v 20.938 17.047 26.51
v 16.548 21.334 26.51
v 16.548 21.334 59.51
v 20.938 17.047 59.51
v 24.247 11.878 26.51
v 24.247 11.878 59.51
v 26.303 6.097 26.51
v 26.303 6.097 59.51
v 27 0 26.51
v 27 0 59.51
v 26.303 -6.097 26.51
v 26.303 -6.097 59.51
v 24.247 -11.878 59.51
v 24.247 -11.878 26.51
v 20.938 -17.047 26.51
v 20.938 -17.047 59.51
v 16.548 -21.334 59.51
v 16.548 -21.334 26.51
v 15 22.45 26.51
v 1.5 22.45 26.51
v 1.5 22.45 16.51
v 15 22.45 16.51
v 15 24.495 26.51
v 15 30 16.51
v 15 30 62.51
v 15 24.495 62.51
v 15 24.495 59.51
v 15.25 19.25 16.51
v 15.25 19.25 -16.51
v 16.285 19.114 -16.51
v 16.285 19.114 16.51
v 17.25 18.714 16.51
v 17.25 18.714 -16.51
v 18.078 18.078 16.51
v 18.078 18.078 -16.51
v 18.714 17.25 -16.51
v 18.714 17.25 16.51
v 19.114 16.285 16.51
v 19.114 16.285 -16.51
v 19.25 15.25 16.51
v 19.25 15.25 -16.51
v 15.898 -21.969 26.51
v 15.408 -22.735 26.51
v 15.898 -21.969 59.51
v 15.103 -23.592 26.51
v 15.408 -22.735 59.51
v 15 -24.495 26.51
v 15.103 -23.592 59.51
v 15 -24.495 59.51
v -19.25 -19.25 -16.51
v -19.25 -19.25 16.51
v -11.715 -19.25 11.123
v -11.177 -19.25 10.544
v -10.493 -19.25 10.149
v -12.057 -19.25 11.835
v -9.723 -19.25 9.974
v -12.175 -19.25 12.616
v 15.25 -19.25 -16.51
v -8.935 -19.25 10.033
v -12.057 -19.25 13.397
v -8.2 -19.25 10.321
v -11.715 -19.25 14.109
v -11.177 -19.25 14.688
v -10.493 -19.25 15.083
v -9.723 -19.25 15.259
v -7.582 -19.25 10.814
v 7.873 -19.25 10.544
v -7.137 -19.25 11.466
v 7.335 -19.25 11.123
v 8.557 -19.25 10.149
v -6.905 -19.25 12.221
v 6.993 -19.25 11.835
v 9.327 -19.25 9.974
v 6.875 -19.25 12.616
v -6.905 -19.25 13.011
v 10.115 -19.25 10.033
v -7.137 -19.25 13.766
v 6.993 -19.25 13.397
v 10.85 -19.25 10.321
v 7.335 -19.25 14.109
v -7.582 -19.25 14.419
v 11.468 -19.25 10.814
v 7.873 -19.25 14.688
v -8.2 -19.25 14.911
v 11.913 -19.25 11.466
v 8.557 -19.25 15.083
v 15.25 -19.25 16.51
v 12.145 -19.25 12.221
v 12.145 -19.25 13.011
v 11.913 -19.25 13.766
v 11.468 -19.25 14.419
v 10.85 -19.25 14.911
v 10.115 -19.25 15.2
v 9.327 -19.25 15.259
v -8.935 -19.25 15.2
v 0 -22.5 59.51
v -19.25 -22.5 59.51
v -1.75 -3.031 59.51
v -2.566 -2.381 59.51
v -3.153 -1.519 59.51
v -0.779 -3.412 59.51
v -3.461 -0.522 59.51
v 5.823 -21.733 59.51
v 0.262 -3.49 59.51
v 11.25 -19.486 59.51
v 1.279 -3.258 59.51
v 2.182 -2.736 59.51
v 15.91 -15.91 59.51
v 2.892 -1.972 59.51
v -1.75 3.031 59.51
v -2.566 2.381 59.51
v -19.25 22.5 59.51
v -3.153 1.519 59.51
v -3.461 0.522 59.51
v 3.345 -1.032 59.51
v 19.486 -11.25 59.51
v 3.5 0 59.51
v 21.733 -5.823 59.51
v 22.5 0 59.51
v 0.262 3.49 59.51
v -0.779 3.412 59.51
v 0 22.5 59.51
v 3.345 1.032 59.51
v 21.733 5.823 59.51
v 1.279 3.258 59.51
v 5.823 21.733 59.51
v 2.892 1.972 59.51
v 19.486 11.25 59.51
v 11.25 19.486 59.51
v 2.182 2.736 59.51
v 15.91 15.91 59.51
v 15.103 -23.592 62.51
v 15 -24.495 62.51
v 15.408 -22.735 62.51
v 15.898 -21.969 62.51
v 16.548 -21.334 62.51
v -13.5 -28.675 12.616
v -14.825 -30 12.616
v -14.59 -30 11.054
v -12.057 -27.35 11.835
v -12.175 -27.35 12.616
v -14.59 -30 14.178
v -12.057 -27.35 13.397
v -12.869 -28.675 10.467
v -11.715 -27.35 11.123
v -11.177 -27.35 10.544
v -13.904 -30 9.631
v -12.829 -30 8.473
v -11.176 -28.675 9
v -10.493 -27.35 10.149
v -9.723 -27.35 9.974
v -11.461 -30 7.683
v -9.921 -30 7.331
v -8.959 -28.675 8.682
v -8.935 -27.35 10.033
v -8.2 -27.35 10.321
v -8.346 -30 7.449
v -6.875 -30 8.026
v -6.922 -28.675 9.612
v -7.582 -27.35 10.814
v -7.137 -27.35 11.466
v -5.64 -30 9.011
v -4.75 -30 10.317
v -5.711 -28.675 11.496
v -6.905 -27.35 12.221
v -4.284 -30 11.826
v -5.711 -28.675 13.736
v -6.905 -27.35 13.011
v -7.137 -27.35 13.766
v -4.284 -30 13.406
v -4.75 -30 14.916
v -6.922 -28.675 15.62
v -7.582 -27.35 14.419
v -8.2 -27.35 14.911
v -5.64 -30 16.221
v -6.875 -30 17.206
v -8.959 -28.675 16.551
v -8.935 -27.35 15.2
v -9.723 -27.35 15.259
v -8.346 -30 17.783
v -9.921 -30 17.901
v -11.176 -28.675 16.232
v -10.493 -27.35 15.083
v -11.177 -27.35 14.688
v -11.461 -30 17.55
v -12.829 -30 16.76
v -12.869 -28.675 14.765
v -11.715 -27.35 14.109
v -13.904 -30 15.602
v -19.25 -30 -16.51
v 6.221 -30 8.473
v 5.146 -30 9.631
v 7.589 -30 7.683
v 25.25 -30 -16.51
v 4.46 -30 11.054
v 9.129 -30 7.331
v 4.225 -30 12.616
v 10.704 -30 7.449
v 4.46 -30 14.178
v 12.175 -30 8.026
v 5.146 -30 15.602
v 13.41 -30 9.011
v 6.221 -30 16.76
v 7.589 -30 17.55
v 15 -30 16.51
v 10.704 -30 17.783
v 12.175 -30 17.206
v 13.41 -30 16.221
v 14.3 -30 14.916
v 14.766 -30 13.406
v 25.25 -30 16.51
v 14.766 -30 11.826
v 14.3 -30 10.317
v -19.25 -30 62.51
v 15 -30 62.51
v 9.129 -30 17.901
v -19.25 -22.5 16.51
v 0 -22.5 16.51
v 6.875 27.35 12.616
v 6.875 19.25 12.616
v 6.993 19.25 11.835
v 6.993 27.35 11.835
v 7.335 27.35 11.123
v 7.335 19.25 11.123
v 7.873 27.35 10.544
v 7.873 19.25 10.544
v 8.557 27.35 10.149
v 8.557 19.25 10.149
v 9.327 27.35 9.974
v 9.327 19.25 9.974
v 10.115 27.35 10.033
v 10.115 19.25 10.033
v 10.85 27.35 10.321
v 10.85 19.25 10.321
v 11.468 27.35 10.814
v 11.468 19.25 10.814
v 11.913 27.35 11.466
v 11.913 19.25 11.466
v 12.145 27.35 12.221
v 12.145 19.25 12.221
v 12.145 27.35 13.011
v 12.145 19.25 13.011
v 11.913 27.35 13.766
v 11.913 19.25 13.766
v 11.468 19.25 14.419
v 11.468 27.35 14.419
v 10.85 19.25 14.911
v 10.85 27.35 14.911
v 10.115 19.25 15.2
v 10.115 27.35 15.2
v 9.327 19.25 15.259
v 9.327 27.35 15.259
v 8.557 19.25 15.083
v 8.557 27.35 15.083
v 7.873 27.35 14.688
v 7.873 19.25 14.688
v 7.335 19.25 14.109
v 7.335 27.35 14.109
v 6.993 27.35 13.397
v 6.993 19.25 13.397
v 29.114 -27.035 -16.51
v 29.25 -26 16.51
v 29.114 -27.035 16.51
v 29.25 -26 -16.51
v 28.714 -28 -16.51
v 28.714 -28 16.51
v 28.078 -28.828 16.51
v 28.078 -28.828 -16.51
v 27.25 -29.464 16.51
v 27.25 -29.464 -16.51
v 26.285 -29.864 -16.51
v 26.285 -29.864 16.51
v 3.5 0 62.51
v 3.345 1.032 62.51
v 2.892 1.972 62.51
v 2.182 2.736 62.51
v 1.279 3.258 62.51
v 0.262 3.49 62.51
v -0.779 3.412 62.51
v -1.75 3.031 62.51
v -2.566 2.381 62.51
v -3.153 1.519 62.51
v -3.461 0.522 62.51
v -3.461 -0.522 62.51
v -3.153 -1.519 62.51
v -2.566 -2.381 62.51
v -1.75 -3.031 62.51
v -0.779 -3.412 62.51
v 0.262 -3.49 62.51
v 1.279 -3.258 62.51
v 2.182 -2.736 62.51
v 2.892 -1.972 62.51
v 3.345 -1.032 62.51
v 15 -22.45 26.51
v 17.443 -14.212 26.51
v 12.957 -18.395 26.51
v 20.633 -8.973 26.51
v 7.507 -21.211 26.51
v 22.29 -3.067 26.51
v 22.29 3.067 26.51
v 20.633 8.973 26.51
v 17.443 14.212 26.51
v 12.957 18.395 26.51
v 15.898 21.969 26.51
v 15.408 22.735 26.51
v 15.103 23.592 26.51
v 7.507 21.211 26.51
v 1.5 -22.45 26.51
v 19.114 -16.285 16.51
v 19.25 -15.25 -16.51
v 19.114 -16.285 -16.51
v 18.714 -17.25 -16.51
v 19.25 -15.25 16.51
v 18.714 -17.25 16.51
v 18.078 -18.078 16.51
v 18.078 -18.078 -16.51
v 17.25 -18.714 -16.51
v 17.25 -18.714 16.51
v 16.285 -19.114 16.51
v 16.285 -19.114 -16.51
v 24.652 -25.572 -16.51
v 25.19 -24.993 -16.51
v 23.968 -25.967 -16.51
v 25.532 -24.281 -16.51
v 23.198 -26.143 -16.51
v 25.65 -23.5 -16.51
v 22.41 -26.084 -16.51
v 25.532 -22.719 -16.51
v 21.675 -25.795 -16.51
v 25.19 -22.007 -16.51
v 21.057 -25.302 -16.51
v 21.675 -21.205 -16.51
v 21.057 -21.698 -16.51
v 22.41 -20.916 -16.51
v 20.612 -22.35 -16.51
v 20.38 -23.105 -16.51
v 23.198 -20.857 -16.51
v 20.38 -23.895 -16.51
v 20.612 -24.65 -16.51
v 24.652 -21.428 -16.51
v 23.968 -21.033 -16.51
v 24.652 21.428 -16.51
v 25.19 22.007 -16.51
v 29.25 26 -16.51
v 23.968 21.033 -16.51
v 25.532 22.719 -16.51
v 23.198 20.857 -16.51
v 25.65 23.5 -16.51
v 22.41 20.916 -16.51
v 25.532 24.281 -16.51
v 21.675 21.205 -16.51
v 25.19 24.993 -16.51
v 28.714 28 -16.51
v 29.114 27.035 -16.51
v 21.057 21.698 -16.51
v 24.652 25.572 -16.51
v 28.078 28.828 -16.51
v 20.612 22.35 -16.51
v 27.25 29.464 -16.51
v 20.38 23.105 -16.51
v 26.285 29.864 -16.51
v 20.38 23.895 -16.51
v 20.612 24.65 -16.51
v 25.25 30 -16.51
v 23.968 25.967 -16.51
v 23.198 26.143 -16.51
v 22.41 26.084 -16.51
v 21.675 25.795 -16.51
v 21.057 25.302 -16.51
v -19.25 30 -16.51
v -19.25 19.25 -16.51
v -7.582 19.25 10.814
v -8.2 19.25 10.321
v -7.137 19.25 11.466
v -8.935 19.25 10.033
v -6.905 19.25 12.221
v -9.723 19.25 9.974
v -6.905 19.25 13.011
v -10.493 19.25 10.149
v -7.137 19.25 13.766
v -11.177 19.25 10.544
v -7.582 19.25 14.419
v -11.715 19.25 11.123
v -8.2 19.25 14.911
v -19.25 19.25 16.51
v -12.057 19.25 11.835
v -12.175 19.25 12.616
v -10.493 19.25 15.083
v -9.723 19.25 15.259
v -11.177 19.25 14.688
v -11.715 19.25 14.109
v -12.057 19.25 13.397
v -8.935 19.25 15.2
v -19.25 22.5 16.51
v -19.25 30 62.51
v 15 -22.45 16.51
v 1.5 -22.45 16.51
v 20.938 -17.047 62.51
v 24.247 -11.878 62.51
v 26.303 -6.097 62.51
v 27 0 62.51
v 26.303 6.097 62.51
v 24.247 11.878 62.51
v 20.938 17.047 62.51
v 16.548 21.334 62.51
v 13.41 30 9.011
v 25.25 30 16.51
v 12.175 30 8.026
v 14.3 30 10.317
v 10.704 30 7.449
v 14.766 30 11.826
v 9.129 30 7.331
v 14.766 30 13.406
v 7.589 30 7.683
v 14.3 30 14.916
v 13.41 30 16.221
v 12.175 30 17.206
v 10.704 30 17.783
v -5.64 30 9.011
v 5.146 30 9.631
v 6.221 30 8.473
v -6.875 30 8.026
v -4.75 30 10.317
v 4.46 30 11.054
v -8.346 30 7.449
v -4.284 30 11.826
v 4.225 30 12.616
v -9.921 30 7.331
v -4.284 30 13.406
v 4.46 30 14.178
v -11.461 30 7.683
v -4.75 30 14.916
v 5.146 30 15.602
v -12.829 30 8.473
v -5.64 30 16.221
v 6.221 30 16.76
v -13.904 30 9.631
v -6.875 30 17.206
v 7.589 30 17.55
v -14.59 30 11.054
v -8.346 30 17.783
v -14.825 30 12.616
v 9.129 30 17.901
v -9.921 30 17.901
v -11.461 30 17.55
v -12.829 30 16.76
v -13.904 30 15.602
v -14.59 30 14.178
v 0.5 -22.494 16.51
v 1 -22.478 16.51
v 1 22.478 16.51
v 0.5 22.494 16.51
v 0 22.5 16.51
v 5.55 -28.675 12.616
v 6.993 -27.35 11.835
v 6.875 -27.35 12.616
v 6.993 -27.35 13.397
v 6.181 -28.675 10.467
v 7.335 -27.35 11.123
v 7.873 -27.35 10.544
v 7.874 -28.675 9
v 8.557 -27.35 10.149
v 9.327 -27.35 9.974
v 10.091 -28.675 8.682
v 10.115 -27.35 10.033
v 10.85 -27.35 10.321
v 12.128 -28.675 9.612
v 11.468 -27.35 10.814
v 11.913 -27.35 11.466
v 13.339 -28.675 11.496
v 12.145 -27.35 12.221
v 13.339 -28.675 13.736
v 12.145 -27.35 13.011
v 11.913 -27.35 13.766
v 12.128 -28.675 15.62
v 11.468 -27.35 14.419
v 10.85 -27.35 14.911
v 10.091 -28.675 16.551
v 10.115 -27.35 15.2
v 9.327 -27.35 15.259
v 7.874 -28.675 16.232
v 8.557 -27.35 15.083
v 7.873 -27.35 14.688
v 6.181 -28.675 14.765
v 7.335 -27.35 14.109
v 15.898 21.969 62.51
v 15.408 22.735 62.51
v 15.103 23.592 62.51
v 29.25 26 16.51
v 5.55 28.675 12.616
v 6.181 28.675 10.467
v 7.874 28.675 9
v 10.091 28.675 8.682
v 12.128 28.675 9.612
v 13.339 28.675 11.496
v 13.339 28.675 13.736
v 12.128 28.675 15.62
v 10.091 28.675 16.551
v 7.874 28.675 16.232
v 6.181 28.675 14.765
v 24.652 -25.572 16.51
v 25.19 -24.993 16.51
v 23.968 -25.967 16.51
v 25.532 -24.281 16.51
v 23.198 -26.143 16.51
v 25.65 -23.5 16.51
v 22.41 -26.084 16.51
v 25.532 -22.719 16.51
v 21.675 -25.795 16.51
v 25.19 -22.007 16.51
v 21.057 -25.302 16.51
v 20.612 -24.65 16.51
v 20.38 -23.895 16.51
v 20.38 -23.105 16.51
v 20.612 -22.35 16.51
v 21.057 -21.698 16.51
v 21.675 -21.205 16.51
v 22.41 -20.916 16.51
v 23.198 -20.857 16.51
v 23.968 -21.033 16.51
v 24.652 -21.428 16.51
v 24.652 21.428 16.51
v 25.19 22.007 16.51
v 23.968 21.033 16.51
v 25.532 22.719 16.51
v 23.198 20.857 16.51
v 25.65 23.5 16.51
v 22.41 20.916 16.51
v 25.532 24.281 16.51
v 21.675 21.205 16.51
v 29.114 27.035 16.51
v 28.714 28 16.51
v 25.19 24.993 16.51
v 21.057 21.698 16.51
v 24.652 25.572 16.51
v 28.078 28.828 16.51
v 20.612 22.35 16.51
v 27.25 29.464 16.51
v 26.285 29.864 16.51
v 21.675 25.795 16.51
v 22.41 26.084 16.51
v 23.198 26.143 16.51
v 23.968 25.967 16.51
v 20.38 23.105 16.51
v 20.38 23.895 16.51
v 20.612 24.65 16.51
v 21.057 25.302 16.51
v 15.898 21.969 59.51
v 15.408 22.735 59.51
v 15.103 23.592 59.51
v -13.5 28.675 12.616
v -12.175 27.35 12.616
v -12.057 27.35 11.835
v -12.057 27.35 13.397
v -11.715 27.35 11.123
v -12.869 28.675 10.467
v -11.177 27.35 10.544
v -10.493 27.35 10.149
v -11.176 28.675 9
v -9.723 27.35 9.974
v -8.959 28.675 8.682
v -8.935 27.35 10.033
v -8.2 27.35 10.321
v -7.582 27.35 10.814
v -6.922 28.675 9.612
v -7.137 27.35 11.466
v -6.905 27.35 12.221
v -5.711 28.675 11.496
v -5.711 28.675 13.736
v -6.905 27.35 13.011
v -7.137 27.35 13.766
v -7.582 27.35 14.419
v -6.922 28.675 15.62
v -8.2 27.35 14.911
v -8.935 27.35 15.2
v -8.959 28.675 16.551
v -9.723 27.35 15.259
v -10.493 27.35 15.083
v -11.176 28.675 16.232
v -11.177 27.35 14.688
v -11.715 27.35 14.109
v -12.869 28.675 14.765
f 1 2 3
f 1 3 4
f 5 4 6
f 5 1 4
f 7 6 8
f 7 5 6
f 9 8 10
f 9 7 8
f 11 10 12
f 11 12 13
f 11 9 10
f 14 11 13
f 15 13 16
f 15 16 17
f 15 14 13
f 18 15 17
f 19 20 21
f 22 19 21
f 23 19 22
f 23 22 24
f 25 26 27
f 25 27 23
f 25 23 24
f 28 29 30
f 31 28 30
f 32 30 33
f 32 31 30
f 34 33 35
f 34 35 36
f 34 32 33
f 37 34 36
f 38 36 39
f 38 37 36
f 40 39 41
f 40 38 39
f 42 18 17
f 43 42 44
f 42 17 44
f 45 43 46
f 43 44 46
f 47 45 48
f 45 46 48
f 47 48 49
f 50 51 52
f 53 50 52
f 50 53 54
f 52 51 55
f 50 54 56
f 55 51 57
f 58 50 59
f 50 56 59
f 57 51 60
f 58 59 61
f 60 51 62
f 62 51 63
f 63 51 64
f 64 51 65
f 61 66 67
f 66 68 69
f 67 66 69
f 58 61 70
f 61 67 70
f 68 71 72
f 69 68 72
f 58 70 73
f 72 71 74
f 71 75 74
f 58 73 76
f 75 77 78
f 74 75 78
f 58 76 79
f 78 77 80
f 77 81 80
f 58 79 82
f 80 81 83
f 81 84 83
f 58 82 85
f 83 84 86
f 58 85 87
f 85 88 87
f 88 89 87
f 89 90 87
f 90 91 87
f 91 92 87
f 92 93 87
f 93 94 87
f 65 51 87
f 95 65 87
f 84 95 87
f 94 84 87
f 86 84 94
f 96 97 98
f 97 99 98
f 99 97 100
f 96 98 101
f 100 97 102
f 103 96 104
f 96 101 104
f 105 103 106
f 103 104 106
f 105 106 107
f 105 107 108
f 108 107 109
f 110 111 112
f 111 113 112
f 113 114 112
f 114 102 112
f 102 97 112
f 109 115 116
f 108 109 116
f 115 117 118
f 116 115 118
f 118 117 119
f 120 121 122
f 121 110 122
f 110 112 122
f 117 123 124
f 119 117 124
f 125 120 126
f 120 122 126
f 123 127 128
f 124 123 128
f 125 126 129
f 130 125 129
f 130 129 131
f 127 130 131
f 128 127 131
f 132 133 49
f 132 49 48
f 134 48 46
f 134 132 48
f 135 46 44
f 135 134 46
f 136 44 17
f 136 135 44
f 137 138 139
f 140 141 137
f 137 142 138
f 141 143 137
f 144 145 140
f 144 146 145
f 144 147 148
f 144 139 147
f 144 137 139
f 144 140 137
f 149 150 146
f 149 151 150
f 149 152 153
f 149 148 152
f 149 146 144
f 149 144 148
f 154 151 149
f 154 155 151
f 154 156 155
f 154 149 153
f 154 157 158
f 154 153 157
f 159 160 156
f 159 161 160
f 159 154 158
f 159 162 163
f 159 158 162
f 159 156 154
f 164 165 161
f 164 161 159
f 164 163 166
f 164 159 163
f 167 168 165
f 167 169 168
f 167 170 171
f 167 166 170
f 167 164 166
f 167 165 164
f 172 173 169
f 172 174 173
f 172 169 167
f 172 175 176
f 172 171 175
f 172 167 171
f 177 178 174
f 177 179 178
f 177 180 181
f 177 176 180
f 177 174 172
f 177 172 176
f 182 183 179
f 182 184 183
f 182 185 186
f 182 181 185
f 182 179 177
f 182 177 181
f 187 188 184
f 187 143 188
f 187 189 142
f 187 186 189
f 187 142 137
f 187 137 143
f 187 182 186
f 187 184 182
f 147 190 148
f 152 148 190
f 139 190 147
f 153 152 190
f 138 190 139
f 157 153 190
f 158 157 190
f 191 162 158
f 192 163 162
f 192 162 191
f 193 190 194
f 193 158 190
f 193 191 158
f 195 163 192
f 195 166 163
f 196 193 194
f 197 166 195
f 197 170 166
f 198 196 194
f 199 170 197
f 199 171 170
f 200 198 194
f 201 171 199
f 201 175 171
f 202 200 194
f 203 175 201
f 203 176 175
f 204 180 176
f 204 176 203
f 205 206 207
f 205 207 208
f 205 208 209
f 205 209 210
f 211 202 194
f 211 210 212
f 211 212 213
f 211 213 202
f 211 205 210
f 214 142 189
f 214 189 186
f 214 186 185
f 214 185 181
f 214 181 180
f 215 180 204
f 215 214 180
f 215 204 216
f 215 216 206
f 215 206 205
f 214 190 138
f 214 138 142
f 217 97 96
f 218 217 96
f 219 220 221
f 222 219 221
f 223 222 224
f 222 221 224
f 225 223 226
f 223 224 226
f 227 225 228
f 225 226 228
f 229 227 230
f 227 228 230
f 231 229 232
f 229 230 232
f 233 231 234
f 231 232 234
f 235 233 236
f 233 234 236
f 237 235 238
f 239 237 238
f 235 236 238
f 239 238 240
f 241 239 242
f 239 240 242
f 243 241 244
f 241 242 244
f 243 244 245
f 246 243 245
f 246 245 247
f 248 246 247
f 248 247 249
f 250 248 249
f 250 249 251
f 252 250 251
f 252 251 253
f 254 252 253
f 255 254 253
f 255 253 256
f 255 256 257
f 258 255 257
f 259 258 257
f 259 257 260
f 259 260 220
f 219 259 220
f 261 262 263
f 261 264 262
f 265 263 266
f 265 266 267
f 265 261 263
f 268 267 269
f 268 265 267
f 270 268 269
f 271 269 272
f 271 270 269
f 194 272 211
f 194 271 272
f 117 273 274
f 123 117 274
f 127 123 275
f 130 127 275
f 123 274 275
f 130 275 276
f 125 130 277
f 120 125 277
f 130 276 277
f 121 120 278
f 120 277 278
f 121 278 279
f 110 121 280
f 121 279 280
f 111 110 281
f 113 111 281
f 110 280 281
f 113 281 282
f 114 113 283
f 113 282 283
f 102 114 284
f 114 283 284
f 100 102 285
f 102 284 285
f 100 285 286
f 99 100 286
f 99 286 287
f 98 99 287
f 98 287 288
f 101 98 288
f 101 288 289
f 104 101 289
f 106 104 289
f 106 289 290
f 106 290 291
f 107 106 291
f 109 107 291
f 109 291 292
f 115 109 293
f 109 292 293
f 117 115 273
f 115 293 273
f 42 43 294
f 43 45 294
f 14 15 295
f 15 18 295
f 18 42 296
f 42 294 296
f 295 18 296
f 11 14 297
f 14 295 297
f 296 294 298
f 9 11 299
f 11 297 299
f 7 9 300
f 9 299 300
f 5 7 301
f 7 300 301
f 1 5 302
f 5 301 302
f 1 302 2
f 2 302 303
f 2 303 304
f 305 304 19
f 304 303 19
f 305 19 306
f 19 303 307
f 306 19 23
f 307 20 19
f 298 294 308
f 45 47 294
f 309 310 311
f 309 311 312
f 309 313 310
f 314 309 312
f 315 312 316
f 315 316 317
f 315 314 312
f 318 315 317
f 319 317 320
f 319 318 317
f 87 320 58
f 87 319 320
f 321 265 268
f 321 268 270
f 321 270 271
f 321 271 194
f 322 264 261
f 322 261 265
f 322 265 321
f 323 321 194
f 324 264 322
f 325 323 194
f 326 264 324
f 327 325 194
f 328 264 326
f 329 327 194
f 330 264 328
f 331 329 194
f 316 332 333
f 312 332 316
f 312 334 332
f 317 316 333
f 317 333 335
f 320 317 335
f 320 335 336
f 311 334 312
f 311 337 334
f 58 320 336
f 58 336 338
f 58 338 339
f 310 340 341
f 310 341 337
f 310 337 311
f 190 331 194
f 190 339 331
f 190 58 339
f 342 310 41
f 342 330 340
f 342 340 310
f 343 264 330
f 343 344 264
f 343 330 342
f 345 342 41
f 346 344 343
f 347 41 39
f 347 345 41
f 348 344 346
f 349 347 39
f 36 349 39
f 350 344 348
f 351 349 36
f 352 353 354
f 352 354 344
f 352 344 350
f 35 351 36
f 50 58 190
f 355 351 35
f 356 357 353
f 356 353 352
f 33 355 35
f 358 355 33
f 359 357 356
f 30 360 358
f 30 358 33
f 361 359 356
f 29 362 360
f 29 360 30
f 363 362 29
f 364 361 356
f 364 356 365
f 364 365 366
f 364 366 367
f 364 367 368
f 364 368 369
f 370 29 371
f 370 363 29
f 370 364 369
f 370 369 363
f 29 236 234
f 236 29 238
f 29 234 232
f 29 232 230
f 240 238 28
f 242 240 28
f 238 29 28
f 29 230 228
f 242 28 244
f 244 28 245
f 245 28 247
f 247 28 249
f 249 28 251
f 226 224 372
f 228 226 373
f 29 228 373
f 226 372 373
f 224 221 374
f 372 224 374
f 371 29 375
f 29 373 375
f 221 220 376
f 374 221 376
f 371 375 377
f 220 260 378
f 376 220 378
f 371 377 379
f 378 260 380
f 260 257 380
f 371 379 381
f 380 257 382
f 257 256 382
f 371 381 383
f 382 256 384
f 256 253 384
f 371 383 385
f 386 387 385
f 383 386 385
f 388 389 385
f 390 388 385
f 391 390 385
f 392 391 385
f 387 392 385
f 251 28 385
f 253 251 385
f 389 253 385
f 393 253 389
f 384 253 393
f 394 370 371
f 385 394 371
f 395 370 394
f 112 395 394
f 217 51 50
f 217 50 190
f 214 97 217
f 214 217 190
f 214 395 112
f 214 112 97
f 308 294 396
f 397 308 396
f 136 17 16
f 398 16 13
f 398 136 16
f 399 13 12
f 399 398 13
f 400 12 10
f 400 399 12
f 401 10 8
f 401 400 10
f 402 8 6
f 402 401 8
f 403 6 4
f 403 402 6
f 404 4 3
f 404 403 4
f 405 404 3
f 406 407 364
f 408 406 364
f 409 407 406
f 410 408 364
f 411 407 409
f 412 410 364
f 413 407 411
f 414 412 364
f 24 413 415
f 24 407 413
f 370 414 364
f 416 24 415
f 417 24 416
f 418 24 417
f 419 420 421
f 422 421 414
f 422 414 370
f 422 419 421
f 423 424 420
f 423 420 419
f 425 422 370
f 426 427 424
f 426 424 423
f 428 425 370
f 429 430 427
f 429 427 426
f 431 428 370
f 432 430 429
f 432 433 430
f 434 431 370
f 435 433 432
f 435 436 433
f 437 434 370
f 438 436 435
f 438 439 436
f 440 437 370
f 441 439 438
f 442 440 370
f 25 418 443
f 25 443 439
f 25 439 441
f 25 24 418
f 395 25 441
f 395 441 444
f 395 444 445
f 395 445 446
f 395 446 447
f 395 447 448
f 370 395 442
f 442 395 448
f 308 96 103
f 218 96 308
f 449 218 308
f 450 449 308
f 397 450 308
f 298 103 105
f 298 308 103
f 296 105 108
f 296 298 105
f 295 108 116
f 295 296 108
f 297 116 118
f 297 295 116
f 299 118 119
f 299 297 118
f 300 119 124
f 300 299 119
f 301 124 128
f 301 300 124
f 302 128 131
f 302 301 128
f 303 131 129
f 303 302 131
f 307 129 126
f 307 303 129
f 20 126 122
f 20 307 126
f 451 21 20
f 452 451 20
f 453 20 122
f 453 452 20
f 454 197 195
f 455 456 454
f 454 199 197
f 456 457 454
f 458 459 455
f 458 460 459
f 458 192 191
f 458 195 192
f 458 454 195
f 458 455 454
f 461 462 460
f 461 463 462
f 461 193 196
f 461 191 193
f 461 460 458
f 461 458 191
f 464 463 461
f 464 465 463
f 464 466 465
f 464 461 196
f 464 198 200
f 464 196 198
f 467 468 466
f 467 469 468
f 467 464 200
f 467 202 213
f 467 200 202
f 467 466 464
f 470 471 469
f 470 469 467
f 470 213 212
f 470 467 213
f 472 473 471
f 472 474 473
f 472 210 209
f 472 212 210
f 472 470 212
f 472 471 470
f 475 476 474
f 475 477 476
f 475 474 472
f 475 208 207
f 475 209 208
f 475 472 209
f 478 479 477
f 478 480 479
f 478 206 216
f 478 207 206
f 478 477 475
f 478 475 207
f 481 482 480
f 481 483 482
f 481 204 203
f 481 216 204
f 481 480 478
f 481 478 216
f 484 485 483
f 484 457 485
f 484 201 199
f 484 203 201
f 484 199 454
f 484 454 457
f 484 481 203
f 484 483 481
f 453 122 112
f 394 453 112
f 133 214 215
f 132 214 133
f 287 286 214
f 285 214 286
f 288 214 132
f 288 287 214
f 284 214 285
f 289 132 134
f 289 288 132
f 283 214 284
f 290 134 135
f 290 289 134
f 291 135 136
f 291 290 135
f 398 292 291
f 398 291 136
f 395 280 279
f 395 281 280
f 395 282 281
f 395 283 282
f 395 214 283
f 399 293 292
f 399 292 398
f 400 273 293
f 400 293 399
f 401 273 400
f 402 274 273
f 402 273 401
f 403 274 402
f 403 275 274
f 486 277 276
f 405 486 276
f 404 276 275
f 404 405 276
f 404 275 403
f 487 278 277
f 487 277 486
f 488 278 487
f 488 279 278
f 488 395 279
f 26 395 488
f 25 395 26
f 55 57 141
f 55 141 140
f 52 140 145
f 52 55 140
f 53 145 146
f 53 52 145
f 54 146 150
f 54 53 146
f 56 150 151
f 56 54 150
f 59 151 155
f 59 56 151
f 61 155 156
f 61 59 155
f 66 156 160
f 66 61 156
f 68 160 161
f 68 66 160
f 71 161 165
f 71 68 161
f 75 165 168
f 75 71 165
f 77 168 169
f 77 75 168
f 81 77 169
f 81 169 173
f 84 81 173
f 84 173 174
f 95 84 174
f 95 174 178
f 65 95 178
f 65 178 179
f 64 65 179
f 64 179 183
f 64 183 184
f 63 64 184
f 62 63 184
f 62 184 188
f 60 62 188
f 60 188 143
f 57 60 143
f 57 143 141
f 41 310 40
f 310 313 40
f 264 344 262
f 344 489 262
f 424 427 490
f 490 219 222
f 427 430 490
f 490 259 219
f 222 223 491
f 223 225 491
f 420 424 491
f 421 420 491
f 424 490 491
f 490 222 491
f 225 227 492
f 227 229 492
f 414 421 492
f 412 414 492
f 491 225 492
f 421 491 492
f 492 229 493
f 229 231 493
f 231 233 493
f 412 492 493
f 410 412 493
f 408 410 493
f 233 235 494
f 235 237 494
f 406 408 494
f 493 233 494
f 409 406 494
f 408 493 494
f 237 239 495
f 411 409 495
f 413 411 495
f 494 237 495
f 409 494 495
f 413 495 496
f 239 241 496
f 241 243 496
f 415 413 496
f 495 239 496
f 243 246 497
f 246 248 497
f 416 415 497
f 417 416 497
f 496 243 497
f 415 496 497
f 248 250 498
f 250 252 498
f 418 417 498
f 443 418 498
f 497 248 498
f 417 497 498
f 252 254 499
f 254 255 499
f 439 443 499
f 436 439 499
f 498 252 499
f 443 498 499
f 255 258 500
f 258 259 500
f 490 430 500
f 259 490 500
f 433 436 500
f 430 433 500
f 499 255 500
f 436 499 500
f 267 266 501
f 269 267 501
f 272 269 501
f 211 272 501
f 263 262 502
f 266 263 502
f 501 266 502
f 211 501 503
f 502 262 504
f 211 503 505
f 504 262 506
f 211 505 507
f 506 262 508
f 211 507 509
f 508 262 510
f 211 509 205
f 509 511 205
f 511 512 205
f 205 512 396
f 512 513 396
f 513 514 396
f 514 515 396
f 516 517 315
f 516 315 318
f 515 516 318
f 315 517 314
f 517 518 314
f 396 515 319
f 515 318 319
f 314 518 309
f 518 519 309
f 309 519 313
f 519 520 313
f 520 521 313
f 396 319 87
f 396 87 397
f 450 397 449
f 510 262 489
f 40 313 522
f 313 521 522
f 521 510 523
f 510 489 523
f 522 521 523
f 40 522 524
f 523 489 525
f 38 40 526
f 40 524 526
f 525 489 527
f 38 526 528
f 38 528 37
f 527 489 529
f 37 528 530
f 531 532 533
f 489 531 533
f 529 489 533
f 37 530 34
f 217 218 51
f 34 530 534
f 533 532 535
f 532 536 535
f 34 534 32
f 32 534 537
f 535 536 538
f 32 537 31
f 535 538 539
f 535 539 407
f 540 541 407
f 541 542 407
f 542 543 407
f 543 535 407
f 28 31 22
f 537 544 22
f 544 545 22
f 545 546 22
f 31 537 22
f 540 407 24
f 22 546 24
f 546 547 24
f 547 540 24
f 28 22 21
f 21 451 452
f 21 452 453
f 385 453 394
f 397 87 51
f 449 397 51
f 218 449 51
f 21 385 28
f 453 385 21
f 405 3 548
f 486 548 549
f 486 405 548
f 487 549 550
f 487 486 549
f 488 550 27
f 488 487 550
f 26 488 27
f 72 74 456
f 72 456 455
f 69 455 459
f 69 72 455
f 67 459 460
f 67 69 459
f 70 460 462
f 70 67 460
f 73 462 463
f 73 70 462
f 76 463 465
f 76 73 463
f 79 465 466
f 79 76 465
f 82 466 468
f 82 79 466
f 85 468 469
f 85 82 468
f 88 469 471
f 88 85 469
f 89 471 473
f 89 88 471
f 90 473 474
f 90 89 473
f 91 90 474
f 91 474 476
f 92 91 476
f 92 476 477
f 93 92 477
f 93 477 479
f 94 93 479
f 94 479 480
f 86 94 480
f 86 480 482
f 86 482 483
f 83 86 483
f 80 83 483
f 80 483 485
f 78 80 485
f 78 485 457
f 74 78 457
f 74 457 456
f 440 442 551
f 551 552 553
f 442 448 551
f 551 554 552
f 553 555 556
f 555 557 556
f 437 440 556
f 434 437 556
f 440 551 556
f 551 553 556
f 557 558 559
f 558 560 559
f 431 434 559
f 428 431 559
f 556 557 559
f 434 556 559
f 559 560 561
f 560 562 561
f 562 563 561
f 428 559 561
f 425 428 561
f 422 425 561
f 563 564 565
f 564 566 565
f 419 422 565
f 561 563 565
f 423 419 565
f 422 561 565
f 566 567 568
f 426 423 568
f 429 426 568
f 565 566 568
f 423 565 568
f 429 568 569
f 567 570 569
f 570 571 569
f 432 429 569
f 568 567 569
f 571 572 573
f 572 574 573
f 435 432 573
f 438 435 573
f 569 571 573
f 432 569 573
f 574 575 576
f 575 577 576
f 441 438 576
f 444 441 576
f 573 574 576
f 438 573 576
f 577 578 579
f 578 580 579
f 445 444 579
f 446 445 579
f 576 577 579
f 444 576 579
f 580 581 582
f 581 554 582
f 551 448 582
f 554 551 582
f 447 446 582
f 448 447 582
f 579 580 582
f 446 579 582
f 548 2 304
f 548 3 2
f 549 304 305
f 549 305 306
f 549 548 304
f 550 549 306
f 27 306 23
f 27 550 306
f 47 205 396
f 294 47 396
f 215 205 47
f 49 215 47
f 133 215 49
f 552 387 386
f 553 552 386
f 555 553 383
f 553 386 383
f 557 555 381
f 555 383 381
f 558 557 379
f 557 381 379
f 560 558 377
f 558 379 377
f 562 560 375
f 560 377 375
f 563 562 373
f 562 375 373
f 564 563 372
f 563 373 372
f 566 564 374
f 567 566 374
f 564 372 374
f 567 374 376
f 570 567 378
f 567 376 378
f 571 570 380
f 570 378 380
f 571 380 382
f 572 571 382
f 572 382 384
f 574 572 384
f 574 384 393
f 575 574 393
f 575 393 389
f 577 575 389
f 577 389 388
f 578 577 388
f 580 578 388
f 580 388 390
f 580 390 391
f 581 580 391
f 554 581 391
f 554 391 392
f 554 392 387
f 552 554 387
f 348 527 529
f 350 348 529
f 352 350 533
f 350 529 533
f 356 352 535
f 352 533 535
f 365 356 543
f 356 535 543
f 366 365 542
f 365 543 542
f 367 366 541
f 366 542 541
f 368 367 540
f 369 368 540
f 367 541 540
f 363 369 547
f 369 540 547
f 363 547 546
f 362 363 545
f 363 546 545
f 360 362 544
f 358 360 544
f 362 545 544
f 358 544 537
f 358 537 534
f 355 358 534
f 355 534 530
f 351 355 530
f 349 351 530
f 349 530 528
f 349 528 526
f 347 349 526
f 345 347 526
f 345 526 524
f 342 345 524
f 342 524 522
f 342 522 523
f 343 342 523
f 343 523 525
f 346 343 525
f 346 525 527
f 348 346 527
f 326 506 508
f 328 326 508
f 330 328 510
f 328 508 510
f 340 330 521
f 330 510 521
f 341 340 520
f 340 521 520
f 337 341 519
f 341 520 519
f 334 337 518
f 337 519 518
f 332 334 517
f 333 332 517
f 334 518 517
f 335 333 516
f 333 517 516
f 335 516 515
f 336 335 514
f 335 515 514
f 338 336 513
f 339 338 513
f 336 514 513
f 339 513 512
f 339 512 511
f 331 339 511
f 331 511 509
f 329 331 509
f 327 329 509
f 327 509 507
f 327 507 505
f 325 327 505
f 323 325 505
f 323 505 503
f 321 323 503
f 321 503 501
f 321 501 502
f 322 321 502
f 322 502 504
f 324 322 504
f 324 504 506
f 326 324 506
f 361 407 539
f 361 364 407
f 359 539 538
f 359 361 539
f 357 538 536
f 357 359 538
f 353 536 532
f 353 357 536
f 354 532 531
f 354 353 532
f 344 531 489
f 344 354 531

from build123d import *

# Parameters (mm, degrees)
BOSS_EXTRUDE1_DEPTH                             = 16.51
M5_CLEARANCE_HOLE1_D                            = 5.3
FILLET1_R                                       = 4
BOSS_EXTRUDE2_DEPTH                             = 43
CUT_EXTRUDE1_DEPTH                              = 83.423844244
CUT_EXTRUDE1_DEPTH_BACK                         = 83.423844244
SKETCH7_W                                       = 10
SKETCH7_H                                       = 44.899888642
FILLET2_R                                       = 4
BOSS_EXTRUDE3_START                             = 3
SKETCH8_R                                       = 3.5
BOSS_EXTRUDE3_DEPTH                             = 3
CSK_FOR_M5_FLAT_HEAD_MACHINE_SCREW1_D           = 5.3
CSK_FOR_M5_FLAT_HEAD_MACHINE_SCREW1_DEPTH       = 10.75
CSK_FOR_M5_FLAT_HEAD_MACHINE_SCREW1_CSINK_D     = 10.6
CSK_FOR_M5_FLAT_HEAD_MACHINE_SCREW1_CSINK_ANGLE = 90


with BuildPart() as part:
    # Sketch1 → Boss-Extrude1 (new, symmetric)
    with BuildSketch(Plane.XY):
        Polygon((-19.25, 19.25), (-19.25, 30), (29.25, 30), (29.25, -30), (-19.25, -30), (-19.25, -19.25), (19.25, -19.25), (19.25, 19.25), align=None)
    extrude(amount=BOSS_EXTRUDE1_DEPTH, both=True)

    # M5 Clearance Hole1 (through all)
    with Locations(Plane(origin=(0, 0, -16.51), x_dir=(-1, 0, 0), z_dir=(0, 0, -1))):
        with Locations((-23, -23.5), (-23, 23.5)):
            Hole(M5_CLEARANCE_HOLE1_D / 2)

    # Fillet1
    fillet1_edges = [part.edges().sort_by_distance(p)[0] for p in [
        (19.25, 19.25, 0),
        (29.25, 30, 0),
        (29.25, -30, 0),
        (19.25, -19.25, 0),
    ]]
    fillet(fillet1_edges, radius=FILLET1_R)

    # Sketch6 → Boss-Extrude2 (add)
    with BuildSketch(Plane.XY.offset(16.51)):
        with BuildLine():
            Line((-19.25, 22.5), (-19.25, 30))
            Line((-19.25, 30), (15, 30))
            Line((15, 30), (15, 22.449944321))
            ThreePointArc((15, 22.449944321), (27, 0), (15, -22.449944321))
            Line((15, -22.449944321), (15, -30))
            Line((15, -30), (-19.25, -30))
            Line((-19.25, -30), (-19.25, -22.5))
            Line((-19.25, -22.5), (0, -22.5))
            ThreePointArc((0, -22.5), (22.5, 0), (0, 22.5))
            Line((0, 22.5), (-19.25, 22.5))
        make_face()
    extrude(amount=BOSS_EXTRUDE2_DEPTH)

    # Sketch7 → Cut-Extrude1 (cut, two sides: drawn at the far end of the back side and taken through both)
    with BuildSketch(Plane(origin=(29.25, 0, 0), x_dir=(0, 0, -1), z_dir=(1, 0, 0)).offset(-CUT_EXTRUDE1_DEPTH_BACK)):
        with Locations((-21.51, 0)):
            Rectangle(SKETCH7_W, SKETCH7_H)
    extrude(amount=CUT_EXTRUDE1_DEPTH + CUT_EXTRUDE1_DEPTH_BACK, mode=Mode.SUBTRACT)

    # Fillet2
    fillet2_edges = [part.edges().sort_by_distance(p)[0] for p in [
        (15, -22.449944321, 43.01),
        (15, 22.449944321, 43.01),
    ]]
    fillet(fillet2_edges, radius=FILLET2_R)

    # Sketch8 → Boss-Extrude3 (add)
    with BuildSketch(Plane.XY.offset(59.51).offset(BOSS_EXTRUDE3_START)):
        with BuildLine():
            Line((-19.25, 22.5), (-19.25, -22.5))
            Line((-19.25, -22.5), (-19.25, -30))
            Line((-19.25, -30), (15, -30))
            Line((15, -30), (15, -24.494897428))
            ThreePointArc((15, -24.494897428), (15.407893959, -22.735132048), (16.548387097, -21.334265502))
            ThreePointArc((16.548387097, -21.334265502), (27, 0), (16.548387097, 21.334265502))
            ThreePointArc((16.548387097, 21.334265502), (15.407893959, 22.735132048), (15, 24.494897428))
            Line((15, 24.494897428), (15, 30))
            Line((15, 30), (-19.25, 30))
            Line((-19.25, 30), (-19.25, 22.5))
        make_face()
        Circle(SKETCH8_R, mode=Mode.SUBTRACT)
    extrude(amount=-BOSS_EXTRUDE3_DEPTH)

    # CSK for M5 Flat Head Machine Screw1
    with Locations(Plane(origin=(0, 30, 0), x_dir=(1, 0, 0), z_dir=(0, 1, 0))):
        with Locations((-9.525, -12.61625), (9.525, -12.61625)):
            csk_for_m5_flat_head_machine_screw1 = CounterSinkHole(CSK_FOR_M5_FLAT_HEAD_MACHINE_SCREW1_D / 2, CSK_FOR_M5_FLAT_HEAD_MACHINE_SCREW1_CSINK_D / 2, depth=CSK_FOR_M5_FLAT_HEAD_MACHINE_SCREW1_DEPTH, counter_sink_angle=CSK_FOR_M5_FLAT_HEAD_MACHINE_SCREW1_CSINK_ANGLE)

    # Mirror1: CSK for M5 Flat Head Machine Screw1 across plane
    add(csk_for_m5_flat_head_machine_screw1.mirror(Plane.ZX), mode=Mode.SUBTRACT)


solid = part.part
